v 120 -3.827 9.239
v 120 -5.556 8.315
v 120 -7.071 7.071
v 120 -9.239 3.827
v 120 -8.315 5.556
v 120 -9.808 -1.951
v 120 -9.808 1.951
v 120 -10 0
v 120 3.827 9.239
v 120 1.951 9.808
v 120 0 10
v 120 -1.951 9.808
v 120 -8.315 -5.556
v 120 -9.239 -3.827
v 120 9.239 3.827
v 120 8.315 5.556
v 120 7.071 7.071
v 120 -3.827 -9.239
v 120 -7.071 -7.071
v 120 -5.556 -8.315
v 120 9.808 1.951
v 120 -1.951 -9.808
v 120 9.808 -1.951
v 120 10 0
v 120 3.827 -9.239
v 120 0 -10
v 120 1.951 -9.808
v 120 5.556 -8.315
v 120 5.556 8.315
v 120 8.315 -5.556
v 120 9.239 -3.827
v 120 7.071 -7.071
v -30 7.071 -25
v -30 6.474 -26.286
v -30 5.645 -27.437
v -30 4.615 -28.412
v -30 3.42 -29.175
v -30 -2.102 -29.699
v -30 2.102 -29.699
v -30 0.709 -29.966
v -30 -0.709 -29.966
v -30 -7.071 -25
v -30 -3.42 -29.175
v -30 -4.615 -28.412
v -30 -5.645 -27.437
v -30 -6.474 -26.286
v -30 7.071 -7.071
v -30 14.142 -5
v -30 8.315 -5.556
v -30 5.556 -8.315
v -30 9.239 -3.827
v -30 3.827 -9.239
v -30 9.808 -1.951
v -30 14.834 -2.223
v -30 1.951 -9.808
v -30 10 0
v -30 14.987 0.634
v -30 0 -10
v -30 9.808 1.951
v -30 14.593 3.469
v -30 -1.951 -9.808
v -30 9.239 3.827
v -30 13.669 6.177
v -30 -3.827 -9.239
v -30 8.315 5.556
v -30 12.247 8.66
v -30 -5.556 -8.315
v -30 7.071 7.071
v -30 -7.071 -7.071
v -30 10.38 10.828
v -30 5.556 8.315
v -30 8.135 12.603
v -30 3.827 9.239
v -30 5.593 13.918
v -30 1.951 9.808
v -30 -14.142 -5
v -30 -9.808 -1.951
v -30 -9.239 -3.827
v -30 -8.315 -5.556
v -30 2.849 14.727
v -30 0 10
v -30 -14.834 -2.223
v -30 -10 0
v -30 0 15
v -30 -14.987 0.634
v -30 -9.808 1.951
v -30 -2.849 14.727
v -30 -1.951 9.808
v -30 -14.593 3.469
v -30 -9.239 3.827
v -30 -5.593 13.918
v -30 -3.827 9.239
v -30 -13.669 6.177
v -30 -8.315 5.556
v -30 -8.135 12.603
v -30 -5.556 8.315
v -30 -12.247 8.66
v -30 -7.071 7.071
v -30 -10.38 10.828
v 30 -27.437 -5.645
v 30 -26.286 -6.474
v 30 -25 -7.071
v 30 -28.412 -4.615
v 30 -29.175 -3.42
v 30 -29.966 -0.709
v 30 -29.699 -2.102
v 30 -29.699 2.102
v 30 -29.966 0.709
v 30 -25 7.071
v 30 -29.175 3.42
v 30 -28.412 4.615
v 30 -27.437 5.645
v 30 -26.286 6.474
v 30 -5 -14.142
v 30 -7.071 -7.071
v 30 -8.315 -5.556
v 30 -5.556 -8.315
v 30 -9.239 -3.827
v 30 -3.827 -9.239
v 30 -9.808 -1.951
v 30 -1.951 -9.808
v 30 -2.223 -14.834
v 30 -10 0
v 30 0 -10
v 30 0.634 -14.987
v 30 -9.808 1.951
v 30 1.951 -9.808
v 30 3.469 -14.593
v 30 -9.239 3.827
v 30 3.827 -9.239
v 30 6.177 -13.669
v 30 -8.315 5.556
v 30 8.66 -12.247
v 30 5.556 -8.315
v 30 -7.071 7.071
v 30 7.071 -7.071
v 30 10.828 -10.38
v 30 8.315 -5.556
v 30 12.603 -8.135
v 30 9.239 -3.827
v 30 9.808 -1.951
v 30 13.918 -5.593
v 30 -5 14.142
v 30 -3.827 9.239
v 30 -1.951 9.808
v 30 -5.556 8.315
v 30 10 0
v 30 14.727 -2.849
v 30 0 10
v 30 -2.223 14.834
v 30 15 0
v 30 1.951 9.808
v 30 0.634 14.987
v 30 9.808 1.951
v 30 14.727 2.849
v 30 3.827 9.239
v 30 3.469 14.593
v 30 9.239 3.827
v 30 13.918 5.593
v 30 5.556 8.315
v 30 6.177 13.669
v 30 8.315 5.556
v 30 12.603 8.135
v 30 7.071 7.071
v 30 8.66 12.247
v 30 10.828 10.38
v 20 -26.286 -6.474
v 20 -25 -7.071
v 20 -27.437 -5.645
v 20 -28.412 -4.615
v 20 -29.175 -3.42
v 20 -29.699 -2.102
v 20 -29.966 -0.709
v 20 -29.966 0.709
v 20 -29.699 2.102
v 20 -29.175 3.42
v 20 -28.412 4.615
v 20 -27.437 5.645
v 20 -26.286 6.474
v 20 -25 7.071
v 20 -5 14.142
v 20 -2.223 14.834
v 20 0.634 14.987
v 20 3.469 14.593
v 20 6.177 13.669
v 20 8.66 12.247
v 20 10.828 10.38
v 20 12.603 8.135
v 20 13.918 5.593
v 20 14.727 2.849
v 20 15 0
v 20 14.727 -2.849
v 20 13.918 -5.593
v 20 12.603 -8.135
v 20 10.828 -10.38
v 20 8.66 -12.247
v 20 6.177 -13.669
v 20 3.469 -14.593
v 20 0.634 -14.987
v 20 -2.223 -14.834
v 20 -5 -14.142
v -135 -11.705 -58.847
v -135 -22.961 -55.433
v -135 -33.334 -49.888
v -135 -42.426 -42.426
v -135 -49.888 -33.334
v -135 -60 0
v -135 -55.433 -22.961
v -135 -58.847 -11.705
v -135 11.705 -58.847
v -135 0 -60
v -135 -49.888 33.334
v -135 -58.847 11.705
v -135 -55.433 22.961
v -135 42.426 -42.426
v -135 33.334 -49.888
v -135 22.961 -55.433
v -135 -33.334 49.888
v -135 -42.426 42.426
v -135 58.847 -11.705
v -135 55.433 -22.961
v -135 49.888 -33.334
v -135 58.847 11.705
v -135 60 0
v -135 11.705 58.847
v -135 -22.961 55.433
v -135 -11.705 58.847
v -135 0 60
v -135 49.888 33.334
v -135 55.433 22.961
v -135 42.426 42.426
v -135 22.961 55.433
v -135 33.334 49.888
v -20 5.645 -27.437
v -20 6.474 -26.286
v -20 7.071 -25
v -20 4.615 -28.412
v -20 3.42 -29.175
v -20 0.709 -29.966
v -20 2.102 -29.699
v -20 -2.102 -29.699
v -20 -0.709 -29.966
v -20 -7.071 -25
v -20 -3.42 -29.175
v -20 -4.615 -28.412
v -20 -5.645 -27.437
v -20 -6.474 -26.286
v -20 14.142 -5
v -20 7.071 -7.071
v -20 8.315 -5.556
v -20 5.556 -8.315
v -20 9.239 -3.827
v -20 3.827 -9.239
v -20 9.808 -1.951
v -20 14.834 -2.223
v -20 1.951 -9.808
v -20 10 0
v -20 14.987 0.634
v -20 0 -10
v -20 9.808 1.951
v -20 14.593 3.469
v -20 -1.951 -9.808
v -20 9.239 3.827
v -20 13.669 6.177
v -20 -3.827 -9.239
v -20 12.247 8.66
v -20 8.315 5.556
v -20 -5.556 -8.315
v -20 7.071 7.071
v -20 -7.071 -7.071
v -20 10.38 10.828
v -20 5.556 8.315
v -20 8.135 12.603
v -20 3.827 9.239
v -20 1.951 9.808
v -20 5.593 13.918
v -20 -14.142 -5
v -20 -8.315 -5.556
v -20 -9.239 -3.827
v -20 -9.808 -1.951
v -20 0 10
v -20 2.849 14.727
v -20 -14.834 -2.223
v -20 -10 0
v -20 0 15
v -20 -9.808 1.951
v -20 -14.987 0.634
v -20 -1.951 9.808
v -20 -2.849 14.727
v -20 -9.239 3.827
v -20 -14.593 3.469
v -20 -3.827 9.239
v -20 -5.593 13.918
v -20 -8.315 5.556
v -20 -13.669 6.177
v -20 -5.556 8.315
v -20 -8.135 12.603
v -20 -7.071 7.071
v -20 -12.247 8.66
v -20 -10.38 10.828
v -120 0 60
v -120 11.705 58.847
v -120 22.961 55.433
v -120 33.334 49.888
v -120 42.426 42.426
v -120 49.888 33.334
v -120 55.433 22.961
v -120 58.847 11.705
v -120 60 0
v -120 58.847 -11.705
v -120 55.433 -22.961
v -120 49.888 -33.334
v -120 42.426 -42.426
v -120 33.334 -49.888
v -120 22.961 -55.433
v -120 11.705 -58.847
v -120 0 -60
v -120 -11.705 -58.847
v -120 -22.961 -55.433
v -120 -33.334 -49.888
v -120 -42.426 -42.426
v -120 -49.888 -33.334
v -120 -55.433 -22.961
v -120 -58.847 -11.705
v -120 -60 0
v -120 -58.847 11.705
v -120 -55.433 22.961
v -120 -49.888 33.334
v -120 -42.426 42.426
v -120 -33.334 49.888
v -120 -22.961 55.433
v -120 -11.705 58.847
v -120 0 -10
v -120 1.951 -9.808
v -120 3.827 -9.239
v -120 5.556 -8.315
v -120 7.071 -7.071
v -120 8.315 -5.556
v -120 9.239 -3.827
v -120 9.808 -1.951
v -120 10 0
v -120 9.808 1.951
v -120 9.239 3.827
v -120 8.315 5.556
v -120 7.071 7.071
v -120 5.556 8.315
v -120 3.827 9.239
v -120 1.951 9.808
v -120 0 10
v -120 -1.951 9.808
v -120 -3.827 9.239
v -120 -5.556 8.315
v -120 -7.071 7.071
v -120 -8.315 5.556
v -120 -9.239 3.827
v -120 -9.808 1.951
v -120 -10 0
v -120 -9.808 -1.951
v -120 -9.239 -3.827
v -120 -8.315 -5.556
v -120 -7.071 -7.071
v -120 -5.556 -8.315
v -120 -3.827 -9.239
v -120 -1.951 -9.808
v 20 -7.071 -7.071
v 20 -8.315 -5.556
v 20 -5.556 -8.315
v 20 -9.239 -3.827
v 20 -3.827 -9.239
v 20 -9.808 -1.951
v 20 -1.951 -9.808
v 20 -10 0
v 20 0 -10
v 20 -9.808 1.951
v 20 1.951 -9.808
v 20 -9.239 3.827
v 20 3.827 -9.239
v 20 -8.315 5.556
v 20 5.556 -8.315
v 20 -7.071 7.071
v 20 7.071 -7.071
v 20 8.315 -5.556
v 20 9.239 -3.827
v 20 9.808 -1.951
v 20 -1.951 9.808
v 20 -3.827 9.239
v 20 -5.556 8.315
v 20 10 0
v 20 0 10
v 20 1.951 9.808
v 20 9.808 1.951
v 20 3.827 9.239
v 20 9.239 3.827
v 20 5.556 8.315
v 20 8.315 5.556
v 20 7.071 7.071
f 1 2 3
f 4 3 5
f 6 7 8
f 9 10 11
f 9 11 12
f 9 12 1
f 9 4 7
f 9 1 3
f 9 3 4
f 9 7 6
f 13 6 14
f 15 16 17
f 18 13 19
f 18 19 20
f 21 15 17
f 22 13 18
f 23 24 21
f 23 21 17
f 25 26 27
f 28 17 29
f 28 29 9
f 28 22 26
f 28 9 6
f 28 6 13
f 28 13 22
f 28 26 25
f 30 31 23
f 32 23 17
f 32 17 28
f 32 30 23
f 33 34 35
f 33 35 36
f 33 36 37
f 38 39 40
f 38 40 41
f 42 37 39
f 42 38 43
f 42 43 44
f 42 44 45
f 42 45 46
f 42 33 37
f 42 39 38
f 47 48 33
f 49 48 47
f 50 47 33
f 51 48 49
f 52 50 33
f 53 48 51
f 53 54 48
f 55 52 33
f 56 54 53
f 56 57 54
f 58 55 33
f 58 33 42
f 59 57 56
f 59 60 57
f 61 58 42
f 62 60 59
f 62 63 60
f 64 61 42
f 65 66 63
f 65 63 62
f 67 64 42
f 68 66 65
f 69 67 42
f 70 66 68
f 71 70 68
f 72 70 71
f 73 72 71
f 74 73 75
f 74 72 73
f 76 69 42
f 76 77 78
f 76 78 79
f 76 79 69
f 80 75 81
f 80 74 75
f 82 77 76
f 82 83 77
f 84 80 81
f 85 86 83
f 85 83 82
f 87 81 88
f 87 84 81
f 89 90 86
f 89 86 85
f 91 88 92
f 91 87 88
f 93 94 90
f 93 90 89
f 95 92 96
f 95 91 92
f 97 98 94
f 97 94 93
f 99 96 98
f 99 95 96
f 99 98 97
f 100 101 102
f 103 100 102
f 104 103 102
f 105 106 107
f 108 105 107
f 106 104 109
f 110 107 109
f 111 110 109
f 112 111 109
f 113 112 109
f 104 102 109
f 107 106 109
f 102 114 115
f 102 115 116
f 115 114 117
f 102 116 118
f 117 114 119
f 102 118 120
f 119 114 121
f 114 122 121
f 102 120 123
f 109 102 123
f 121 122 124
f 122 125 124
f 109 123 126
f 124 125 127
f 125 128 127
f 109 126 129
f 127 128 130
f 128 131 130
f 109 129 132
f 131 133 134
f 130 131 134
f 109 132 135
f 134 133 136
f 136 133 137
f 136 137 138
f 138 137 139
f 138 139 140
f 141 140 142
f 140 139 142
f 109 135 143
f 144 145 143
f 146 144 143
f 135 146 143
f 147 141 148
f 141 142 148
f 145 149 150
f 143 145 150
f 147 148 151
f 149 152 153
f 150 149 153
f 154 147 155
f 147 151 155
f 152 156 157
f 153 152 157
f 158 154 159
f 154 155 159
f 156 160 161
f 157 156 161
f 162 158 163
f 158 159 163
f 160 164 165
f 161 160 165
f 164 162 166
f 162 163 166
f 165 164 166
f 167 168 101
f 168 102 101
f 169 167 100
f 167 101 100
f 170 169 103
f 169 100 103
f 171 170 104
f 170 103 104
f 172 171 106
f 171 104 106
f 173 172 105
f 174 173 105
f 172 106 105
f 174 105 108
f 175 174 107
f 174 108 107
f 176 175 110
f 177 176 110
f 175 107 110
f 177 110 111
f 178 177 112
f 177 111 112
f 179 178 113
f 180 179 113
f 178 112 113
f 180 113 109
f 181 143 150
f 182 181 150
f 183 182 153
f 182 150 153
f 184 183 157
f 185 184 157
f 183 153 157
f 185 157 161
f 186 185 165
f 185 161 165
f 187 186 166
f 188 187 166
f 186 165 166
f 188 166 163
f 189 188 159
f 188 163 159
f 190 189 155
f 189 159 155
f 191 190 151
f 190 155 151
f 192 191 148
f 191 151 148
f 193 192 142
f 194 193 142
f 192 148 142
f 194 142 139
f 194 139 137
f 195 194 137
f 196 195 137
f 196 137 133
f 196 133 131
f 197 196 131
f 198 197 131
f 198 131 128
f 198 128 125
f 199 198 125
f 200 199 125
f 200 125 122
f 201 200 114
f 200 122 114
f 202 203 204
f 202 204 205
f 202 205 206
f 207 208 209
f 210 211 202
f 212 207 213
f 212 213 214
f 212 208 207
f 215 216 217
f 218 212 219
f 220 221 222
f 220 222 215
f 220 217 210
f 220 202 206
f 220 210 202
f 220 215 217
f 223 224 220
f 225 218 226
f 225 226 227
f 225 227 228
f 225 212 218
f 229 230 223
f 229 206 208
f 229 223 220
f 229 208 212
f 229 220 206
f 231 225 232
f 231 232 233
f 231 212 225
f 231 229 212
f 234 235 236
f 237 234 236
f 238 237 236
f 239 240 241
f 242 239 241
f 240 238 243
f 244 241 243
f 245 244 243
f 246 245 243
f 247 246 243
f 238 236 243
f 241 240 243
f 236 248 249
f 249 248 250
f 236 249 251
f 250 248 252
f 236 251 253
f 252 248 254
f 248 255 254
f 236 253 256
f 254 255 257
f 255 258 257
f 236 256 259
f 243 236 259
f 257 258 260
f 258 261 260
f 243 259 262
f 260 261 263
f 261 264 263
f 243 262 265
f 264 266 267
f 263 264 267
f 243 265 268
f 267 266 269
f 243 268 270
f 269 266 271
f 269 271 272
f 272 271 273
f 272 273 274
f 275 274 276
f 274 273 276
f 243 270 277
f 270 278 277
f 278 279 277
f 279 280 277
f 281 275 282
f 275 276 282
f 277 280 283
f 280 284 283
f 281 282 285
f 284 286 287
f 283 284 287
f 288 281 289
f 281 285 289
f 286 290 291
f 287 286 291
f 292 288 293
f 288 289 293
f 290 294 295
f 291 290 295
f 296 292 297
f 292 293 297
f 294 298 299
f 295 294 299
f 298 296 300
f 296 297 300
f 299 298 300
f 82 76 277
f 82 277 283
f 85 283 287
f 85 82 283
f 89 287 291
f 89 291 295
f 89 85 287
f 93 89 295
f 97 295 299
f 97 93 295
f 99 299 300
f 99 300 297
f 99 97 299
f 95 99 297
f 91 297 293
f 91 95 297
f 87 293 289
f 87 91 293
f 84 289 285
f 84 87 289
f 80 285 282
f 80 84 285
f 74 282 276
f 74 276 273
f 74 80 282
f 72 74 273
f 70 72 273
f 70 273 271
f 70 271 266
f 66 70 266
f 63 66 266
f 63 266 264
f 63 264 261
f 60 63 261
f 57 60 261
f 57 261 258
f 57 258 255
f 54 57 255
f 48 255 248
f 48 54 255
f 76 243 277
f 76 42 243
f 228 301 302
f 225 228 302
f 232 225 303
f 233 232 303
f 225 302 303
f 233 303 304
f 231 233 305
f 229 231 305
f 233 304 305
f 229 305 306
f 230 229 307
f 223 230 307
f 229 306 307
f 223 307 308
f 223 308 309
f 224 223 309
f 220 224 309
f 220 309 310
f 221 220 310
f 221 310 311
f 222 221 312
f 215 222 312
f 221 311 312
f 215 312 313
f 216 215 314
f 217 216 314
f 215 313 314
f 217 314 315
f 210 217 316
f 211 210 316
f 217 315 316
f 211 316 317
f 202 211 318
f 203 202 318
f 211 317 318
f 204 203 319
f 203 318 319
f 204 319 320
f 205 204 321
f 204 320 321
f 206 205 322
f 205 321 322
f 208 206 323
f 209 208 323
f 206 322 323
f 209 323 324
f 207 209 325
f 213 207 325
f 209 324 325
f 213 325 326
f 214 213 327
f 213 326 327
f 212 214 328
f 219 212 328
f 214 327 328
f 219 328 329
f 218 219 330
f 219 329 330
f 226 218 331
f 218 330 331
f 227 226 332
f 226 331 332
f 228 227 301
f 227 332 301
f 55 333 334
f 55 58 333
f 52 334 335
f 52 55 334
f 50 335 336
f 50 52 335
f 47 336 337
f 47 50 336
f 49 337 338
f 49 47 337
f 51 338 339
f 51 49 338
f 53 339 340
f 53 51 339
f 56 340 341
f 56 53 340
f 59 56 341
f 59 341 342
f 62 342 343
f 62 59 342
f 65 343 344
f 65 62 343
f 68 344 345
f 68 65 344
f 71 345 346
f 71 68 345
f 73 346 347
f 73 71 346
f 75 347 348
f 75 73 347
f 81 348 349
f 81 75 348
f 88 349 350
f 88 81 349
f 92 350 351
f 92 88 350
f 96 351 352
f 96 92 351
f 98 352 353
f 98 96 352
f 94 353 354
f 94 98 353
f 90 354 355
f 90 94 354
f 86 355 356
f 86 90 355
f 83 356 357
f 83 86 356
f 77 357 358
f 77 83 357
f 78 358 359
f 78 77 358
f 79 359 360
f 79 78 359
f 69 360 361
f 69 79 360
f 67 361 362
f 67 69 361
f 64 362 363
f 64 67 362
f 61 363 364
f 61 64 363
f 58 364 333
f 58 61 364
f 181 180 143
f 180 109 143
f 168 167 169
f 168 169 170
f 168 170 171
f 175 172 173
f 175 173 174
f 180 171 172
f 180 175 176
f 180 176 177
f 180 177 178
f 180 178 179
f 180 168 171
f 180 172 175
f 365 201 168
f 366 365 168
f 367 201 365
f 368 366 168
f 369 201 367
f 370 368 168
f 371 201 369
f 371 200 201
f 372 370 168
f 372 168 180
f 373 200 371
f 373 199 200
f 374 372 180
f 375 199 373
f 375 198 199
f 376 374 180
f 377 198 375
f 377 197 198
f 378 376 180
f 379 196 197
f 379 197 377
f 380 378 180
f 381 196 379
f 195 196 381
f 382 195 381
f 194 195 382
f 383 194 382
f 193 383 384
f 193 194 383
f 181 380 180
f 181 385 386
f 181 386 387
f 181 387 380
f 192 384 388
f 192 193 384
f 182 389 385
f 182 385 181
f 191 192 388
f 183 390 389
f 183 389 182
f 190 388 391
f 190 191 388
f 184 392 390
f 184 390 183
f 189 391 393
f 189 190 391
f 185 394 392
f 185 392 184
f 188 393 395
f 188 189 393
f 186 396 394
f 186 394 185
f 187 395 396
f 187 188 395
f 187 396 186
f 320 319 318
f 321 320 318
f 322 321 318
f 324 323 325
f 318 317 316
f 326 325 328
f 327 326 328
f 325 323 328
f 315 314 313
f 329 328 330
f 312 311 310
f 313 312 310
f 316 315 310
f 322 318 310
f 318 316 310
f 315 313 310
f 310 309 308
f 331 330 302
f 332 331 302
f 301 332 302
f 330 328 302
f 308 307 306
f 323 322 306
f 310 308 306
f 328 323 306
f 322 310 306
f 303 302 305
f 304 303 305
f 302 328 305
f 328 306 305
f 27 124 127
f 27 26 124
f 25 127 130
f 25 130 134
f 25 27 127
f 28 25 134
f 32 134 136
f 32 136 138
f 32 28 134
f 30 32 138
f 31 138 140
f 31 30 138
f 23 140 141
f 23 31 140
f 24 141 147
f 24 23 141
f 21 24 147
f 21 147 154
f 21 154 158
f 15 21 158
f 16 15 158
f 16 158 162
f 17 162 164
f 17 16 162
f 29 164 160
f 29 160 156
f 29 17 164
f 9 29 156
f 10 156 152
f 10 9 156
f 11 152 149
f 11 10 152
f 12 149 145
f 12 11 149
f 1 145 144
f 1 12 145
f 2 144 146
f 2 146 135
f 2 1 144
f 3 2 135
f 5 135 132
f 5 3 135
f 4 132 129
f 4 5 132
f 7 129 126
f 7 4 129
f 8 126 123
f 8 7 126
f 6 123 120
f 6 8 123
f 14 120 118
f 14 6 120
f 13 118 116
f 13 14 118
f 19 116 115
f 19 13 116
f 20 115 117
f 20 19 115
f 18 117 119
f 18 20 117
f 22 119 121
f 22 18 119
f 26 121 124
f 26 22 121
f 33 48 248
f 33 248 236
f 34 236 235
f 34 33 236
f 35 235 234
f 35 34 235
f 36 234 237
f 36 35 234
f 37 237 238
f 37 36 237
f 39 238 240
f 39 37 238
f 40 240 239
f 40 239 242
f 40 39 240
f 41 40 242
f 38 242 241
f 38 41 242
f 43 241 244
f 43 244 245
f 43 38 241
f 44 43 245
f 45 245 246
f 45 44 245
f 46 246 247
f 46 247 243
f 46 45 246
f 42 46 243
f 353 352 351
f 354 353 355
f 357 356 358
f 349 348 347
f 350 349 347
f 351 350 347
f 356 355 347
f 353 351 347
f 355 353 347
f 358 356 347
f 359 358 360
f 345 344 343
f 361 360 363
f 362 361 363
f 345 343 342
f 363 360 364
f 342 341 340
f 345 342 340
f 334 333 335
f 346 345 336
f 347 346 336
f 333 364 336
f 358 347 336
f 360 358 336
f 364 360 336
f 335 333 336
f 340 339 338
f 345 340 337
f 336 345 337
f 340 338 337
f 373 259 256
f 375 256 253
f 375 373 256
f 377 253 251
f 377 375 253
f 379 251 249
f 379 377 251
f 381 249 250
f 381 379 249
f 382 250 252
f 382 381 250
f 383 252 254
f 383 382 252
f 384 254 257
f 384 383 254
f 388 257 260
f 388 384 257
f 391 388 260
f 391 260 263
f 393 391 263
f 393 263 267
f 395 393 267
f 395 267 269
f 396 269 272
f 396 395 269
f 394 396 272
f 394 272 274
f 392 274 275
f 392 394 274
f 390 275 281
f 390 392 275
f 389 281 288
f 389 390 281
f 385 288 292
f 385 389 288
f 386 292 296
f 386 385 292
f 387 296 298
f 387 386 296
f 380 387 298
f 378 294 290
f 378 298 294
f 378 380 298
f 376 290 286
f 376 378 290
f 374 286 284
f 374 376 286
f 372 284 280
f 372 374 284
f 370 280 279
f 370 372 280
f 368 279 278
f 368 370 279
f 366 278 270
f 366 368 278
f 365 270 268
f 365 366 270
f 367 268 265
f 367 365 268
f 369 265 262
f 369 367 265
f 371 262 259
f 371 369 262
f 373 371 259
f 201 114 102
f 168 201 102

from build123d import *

# Parameters (mm, degrees)
SKETCH1_R             = 10
BOSS_EXTRUDE1_DEPTH   = 120
SKETCH3_R             = 10
BOSS_EXTRUDE2_DEPTH   = 5
BODY_MOVE_COPY1_ANGLE = 90
SKETCH5_R             = 60
BOSS_EXTRUDE3_DEPTH   = 15


with BuildPart() as part:
    # Sketch1 → Boss-Extrude1 (new body, symmetric)
    with BuildSketch(Plane(origin=(0, 0, 0), x_dir=(0, 0, -1), z_dir=(1, 0, 0))):
        Circle(SKETCH1_R)
    extrude(amount=BOSS_EXTRUDE1_DEPTH, both=True)


with BuildPart() as body_2:
    # Sketch3 → Boss-Extrude2 (new body, symmetric)
    with BuildSketch(Plane(origin=(25, 0, 0), x_dir=(0, 0, -1), z_dir=(1, 0, 0))):
        with BuildLine():
            Line((14.142135624, -5), (7.071067812, -25))
            ThreePointArc((7.071067812, -25), (0, -30), (-7.071067812, -25))
            Line((-7.071067812, -25), (-14.142135624, -5))
            ThreePointArc((-14.142135624, -5), (0, 15), (14.142135624, -5))
        make_face()
        Circle(SKETCH3_R, mode=Mode.SUBTRACT)
    extrude(amount=BOSS_EXTRUDE2_DEPTH, both=True)


with BuildPart() as body_3:
    # Mirror1: mirrored copy
    add(body_2.part.mirror(Plane(origin=(0, 0, 0), x_dir=(0, 0, 1), z_dir=(1, 0, 0))))


with BuildPart() as body_3_1:
    # Body-Move/Copy1: moved
    add(body_3.part.rotate(Axis((0, 0, 0), (1, 0, 0)), BODY_MOVE_COPY1_ANGLE))


with BuildPart() as part_1:
    add(part.part)

    # Combine1: union body 2, body 3
    add(body_2.part)
    add(body_3_1.part)


with BuildPart() as body_2_2:
    # Sketch5 → Boss-Extrude3 (new body)
    with BuildSketch(Plane.ZY.offset(120)):
        Circle(SKETCH5_R)
    extrude(amount=BOSS_EXTRUDE3_DEPTH)


solid = Compound([part_1.part, body_2_2.part])
